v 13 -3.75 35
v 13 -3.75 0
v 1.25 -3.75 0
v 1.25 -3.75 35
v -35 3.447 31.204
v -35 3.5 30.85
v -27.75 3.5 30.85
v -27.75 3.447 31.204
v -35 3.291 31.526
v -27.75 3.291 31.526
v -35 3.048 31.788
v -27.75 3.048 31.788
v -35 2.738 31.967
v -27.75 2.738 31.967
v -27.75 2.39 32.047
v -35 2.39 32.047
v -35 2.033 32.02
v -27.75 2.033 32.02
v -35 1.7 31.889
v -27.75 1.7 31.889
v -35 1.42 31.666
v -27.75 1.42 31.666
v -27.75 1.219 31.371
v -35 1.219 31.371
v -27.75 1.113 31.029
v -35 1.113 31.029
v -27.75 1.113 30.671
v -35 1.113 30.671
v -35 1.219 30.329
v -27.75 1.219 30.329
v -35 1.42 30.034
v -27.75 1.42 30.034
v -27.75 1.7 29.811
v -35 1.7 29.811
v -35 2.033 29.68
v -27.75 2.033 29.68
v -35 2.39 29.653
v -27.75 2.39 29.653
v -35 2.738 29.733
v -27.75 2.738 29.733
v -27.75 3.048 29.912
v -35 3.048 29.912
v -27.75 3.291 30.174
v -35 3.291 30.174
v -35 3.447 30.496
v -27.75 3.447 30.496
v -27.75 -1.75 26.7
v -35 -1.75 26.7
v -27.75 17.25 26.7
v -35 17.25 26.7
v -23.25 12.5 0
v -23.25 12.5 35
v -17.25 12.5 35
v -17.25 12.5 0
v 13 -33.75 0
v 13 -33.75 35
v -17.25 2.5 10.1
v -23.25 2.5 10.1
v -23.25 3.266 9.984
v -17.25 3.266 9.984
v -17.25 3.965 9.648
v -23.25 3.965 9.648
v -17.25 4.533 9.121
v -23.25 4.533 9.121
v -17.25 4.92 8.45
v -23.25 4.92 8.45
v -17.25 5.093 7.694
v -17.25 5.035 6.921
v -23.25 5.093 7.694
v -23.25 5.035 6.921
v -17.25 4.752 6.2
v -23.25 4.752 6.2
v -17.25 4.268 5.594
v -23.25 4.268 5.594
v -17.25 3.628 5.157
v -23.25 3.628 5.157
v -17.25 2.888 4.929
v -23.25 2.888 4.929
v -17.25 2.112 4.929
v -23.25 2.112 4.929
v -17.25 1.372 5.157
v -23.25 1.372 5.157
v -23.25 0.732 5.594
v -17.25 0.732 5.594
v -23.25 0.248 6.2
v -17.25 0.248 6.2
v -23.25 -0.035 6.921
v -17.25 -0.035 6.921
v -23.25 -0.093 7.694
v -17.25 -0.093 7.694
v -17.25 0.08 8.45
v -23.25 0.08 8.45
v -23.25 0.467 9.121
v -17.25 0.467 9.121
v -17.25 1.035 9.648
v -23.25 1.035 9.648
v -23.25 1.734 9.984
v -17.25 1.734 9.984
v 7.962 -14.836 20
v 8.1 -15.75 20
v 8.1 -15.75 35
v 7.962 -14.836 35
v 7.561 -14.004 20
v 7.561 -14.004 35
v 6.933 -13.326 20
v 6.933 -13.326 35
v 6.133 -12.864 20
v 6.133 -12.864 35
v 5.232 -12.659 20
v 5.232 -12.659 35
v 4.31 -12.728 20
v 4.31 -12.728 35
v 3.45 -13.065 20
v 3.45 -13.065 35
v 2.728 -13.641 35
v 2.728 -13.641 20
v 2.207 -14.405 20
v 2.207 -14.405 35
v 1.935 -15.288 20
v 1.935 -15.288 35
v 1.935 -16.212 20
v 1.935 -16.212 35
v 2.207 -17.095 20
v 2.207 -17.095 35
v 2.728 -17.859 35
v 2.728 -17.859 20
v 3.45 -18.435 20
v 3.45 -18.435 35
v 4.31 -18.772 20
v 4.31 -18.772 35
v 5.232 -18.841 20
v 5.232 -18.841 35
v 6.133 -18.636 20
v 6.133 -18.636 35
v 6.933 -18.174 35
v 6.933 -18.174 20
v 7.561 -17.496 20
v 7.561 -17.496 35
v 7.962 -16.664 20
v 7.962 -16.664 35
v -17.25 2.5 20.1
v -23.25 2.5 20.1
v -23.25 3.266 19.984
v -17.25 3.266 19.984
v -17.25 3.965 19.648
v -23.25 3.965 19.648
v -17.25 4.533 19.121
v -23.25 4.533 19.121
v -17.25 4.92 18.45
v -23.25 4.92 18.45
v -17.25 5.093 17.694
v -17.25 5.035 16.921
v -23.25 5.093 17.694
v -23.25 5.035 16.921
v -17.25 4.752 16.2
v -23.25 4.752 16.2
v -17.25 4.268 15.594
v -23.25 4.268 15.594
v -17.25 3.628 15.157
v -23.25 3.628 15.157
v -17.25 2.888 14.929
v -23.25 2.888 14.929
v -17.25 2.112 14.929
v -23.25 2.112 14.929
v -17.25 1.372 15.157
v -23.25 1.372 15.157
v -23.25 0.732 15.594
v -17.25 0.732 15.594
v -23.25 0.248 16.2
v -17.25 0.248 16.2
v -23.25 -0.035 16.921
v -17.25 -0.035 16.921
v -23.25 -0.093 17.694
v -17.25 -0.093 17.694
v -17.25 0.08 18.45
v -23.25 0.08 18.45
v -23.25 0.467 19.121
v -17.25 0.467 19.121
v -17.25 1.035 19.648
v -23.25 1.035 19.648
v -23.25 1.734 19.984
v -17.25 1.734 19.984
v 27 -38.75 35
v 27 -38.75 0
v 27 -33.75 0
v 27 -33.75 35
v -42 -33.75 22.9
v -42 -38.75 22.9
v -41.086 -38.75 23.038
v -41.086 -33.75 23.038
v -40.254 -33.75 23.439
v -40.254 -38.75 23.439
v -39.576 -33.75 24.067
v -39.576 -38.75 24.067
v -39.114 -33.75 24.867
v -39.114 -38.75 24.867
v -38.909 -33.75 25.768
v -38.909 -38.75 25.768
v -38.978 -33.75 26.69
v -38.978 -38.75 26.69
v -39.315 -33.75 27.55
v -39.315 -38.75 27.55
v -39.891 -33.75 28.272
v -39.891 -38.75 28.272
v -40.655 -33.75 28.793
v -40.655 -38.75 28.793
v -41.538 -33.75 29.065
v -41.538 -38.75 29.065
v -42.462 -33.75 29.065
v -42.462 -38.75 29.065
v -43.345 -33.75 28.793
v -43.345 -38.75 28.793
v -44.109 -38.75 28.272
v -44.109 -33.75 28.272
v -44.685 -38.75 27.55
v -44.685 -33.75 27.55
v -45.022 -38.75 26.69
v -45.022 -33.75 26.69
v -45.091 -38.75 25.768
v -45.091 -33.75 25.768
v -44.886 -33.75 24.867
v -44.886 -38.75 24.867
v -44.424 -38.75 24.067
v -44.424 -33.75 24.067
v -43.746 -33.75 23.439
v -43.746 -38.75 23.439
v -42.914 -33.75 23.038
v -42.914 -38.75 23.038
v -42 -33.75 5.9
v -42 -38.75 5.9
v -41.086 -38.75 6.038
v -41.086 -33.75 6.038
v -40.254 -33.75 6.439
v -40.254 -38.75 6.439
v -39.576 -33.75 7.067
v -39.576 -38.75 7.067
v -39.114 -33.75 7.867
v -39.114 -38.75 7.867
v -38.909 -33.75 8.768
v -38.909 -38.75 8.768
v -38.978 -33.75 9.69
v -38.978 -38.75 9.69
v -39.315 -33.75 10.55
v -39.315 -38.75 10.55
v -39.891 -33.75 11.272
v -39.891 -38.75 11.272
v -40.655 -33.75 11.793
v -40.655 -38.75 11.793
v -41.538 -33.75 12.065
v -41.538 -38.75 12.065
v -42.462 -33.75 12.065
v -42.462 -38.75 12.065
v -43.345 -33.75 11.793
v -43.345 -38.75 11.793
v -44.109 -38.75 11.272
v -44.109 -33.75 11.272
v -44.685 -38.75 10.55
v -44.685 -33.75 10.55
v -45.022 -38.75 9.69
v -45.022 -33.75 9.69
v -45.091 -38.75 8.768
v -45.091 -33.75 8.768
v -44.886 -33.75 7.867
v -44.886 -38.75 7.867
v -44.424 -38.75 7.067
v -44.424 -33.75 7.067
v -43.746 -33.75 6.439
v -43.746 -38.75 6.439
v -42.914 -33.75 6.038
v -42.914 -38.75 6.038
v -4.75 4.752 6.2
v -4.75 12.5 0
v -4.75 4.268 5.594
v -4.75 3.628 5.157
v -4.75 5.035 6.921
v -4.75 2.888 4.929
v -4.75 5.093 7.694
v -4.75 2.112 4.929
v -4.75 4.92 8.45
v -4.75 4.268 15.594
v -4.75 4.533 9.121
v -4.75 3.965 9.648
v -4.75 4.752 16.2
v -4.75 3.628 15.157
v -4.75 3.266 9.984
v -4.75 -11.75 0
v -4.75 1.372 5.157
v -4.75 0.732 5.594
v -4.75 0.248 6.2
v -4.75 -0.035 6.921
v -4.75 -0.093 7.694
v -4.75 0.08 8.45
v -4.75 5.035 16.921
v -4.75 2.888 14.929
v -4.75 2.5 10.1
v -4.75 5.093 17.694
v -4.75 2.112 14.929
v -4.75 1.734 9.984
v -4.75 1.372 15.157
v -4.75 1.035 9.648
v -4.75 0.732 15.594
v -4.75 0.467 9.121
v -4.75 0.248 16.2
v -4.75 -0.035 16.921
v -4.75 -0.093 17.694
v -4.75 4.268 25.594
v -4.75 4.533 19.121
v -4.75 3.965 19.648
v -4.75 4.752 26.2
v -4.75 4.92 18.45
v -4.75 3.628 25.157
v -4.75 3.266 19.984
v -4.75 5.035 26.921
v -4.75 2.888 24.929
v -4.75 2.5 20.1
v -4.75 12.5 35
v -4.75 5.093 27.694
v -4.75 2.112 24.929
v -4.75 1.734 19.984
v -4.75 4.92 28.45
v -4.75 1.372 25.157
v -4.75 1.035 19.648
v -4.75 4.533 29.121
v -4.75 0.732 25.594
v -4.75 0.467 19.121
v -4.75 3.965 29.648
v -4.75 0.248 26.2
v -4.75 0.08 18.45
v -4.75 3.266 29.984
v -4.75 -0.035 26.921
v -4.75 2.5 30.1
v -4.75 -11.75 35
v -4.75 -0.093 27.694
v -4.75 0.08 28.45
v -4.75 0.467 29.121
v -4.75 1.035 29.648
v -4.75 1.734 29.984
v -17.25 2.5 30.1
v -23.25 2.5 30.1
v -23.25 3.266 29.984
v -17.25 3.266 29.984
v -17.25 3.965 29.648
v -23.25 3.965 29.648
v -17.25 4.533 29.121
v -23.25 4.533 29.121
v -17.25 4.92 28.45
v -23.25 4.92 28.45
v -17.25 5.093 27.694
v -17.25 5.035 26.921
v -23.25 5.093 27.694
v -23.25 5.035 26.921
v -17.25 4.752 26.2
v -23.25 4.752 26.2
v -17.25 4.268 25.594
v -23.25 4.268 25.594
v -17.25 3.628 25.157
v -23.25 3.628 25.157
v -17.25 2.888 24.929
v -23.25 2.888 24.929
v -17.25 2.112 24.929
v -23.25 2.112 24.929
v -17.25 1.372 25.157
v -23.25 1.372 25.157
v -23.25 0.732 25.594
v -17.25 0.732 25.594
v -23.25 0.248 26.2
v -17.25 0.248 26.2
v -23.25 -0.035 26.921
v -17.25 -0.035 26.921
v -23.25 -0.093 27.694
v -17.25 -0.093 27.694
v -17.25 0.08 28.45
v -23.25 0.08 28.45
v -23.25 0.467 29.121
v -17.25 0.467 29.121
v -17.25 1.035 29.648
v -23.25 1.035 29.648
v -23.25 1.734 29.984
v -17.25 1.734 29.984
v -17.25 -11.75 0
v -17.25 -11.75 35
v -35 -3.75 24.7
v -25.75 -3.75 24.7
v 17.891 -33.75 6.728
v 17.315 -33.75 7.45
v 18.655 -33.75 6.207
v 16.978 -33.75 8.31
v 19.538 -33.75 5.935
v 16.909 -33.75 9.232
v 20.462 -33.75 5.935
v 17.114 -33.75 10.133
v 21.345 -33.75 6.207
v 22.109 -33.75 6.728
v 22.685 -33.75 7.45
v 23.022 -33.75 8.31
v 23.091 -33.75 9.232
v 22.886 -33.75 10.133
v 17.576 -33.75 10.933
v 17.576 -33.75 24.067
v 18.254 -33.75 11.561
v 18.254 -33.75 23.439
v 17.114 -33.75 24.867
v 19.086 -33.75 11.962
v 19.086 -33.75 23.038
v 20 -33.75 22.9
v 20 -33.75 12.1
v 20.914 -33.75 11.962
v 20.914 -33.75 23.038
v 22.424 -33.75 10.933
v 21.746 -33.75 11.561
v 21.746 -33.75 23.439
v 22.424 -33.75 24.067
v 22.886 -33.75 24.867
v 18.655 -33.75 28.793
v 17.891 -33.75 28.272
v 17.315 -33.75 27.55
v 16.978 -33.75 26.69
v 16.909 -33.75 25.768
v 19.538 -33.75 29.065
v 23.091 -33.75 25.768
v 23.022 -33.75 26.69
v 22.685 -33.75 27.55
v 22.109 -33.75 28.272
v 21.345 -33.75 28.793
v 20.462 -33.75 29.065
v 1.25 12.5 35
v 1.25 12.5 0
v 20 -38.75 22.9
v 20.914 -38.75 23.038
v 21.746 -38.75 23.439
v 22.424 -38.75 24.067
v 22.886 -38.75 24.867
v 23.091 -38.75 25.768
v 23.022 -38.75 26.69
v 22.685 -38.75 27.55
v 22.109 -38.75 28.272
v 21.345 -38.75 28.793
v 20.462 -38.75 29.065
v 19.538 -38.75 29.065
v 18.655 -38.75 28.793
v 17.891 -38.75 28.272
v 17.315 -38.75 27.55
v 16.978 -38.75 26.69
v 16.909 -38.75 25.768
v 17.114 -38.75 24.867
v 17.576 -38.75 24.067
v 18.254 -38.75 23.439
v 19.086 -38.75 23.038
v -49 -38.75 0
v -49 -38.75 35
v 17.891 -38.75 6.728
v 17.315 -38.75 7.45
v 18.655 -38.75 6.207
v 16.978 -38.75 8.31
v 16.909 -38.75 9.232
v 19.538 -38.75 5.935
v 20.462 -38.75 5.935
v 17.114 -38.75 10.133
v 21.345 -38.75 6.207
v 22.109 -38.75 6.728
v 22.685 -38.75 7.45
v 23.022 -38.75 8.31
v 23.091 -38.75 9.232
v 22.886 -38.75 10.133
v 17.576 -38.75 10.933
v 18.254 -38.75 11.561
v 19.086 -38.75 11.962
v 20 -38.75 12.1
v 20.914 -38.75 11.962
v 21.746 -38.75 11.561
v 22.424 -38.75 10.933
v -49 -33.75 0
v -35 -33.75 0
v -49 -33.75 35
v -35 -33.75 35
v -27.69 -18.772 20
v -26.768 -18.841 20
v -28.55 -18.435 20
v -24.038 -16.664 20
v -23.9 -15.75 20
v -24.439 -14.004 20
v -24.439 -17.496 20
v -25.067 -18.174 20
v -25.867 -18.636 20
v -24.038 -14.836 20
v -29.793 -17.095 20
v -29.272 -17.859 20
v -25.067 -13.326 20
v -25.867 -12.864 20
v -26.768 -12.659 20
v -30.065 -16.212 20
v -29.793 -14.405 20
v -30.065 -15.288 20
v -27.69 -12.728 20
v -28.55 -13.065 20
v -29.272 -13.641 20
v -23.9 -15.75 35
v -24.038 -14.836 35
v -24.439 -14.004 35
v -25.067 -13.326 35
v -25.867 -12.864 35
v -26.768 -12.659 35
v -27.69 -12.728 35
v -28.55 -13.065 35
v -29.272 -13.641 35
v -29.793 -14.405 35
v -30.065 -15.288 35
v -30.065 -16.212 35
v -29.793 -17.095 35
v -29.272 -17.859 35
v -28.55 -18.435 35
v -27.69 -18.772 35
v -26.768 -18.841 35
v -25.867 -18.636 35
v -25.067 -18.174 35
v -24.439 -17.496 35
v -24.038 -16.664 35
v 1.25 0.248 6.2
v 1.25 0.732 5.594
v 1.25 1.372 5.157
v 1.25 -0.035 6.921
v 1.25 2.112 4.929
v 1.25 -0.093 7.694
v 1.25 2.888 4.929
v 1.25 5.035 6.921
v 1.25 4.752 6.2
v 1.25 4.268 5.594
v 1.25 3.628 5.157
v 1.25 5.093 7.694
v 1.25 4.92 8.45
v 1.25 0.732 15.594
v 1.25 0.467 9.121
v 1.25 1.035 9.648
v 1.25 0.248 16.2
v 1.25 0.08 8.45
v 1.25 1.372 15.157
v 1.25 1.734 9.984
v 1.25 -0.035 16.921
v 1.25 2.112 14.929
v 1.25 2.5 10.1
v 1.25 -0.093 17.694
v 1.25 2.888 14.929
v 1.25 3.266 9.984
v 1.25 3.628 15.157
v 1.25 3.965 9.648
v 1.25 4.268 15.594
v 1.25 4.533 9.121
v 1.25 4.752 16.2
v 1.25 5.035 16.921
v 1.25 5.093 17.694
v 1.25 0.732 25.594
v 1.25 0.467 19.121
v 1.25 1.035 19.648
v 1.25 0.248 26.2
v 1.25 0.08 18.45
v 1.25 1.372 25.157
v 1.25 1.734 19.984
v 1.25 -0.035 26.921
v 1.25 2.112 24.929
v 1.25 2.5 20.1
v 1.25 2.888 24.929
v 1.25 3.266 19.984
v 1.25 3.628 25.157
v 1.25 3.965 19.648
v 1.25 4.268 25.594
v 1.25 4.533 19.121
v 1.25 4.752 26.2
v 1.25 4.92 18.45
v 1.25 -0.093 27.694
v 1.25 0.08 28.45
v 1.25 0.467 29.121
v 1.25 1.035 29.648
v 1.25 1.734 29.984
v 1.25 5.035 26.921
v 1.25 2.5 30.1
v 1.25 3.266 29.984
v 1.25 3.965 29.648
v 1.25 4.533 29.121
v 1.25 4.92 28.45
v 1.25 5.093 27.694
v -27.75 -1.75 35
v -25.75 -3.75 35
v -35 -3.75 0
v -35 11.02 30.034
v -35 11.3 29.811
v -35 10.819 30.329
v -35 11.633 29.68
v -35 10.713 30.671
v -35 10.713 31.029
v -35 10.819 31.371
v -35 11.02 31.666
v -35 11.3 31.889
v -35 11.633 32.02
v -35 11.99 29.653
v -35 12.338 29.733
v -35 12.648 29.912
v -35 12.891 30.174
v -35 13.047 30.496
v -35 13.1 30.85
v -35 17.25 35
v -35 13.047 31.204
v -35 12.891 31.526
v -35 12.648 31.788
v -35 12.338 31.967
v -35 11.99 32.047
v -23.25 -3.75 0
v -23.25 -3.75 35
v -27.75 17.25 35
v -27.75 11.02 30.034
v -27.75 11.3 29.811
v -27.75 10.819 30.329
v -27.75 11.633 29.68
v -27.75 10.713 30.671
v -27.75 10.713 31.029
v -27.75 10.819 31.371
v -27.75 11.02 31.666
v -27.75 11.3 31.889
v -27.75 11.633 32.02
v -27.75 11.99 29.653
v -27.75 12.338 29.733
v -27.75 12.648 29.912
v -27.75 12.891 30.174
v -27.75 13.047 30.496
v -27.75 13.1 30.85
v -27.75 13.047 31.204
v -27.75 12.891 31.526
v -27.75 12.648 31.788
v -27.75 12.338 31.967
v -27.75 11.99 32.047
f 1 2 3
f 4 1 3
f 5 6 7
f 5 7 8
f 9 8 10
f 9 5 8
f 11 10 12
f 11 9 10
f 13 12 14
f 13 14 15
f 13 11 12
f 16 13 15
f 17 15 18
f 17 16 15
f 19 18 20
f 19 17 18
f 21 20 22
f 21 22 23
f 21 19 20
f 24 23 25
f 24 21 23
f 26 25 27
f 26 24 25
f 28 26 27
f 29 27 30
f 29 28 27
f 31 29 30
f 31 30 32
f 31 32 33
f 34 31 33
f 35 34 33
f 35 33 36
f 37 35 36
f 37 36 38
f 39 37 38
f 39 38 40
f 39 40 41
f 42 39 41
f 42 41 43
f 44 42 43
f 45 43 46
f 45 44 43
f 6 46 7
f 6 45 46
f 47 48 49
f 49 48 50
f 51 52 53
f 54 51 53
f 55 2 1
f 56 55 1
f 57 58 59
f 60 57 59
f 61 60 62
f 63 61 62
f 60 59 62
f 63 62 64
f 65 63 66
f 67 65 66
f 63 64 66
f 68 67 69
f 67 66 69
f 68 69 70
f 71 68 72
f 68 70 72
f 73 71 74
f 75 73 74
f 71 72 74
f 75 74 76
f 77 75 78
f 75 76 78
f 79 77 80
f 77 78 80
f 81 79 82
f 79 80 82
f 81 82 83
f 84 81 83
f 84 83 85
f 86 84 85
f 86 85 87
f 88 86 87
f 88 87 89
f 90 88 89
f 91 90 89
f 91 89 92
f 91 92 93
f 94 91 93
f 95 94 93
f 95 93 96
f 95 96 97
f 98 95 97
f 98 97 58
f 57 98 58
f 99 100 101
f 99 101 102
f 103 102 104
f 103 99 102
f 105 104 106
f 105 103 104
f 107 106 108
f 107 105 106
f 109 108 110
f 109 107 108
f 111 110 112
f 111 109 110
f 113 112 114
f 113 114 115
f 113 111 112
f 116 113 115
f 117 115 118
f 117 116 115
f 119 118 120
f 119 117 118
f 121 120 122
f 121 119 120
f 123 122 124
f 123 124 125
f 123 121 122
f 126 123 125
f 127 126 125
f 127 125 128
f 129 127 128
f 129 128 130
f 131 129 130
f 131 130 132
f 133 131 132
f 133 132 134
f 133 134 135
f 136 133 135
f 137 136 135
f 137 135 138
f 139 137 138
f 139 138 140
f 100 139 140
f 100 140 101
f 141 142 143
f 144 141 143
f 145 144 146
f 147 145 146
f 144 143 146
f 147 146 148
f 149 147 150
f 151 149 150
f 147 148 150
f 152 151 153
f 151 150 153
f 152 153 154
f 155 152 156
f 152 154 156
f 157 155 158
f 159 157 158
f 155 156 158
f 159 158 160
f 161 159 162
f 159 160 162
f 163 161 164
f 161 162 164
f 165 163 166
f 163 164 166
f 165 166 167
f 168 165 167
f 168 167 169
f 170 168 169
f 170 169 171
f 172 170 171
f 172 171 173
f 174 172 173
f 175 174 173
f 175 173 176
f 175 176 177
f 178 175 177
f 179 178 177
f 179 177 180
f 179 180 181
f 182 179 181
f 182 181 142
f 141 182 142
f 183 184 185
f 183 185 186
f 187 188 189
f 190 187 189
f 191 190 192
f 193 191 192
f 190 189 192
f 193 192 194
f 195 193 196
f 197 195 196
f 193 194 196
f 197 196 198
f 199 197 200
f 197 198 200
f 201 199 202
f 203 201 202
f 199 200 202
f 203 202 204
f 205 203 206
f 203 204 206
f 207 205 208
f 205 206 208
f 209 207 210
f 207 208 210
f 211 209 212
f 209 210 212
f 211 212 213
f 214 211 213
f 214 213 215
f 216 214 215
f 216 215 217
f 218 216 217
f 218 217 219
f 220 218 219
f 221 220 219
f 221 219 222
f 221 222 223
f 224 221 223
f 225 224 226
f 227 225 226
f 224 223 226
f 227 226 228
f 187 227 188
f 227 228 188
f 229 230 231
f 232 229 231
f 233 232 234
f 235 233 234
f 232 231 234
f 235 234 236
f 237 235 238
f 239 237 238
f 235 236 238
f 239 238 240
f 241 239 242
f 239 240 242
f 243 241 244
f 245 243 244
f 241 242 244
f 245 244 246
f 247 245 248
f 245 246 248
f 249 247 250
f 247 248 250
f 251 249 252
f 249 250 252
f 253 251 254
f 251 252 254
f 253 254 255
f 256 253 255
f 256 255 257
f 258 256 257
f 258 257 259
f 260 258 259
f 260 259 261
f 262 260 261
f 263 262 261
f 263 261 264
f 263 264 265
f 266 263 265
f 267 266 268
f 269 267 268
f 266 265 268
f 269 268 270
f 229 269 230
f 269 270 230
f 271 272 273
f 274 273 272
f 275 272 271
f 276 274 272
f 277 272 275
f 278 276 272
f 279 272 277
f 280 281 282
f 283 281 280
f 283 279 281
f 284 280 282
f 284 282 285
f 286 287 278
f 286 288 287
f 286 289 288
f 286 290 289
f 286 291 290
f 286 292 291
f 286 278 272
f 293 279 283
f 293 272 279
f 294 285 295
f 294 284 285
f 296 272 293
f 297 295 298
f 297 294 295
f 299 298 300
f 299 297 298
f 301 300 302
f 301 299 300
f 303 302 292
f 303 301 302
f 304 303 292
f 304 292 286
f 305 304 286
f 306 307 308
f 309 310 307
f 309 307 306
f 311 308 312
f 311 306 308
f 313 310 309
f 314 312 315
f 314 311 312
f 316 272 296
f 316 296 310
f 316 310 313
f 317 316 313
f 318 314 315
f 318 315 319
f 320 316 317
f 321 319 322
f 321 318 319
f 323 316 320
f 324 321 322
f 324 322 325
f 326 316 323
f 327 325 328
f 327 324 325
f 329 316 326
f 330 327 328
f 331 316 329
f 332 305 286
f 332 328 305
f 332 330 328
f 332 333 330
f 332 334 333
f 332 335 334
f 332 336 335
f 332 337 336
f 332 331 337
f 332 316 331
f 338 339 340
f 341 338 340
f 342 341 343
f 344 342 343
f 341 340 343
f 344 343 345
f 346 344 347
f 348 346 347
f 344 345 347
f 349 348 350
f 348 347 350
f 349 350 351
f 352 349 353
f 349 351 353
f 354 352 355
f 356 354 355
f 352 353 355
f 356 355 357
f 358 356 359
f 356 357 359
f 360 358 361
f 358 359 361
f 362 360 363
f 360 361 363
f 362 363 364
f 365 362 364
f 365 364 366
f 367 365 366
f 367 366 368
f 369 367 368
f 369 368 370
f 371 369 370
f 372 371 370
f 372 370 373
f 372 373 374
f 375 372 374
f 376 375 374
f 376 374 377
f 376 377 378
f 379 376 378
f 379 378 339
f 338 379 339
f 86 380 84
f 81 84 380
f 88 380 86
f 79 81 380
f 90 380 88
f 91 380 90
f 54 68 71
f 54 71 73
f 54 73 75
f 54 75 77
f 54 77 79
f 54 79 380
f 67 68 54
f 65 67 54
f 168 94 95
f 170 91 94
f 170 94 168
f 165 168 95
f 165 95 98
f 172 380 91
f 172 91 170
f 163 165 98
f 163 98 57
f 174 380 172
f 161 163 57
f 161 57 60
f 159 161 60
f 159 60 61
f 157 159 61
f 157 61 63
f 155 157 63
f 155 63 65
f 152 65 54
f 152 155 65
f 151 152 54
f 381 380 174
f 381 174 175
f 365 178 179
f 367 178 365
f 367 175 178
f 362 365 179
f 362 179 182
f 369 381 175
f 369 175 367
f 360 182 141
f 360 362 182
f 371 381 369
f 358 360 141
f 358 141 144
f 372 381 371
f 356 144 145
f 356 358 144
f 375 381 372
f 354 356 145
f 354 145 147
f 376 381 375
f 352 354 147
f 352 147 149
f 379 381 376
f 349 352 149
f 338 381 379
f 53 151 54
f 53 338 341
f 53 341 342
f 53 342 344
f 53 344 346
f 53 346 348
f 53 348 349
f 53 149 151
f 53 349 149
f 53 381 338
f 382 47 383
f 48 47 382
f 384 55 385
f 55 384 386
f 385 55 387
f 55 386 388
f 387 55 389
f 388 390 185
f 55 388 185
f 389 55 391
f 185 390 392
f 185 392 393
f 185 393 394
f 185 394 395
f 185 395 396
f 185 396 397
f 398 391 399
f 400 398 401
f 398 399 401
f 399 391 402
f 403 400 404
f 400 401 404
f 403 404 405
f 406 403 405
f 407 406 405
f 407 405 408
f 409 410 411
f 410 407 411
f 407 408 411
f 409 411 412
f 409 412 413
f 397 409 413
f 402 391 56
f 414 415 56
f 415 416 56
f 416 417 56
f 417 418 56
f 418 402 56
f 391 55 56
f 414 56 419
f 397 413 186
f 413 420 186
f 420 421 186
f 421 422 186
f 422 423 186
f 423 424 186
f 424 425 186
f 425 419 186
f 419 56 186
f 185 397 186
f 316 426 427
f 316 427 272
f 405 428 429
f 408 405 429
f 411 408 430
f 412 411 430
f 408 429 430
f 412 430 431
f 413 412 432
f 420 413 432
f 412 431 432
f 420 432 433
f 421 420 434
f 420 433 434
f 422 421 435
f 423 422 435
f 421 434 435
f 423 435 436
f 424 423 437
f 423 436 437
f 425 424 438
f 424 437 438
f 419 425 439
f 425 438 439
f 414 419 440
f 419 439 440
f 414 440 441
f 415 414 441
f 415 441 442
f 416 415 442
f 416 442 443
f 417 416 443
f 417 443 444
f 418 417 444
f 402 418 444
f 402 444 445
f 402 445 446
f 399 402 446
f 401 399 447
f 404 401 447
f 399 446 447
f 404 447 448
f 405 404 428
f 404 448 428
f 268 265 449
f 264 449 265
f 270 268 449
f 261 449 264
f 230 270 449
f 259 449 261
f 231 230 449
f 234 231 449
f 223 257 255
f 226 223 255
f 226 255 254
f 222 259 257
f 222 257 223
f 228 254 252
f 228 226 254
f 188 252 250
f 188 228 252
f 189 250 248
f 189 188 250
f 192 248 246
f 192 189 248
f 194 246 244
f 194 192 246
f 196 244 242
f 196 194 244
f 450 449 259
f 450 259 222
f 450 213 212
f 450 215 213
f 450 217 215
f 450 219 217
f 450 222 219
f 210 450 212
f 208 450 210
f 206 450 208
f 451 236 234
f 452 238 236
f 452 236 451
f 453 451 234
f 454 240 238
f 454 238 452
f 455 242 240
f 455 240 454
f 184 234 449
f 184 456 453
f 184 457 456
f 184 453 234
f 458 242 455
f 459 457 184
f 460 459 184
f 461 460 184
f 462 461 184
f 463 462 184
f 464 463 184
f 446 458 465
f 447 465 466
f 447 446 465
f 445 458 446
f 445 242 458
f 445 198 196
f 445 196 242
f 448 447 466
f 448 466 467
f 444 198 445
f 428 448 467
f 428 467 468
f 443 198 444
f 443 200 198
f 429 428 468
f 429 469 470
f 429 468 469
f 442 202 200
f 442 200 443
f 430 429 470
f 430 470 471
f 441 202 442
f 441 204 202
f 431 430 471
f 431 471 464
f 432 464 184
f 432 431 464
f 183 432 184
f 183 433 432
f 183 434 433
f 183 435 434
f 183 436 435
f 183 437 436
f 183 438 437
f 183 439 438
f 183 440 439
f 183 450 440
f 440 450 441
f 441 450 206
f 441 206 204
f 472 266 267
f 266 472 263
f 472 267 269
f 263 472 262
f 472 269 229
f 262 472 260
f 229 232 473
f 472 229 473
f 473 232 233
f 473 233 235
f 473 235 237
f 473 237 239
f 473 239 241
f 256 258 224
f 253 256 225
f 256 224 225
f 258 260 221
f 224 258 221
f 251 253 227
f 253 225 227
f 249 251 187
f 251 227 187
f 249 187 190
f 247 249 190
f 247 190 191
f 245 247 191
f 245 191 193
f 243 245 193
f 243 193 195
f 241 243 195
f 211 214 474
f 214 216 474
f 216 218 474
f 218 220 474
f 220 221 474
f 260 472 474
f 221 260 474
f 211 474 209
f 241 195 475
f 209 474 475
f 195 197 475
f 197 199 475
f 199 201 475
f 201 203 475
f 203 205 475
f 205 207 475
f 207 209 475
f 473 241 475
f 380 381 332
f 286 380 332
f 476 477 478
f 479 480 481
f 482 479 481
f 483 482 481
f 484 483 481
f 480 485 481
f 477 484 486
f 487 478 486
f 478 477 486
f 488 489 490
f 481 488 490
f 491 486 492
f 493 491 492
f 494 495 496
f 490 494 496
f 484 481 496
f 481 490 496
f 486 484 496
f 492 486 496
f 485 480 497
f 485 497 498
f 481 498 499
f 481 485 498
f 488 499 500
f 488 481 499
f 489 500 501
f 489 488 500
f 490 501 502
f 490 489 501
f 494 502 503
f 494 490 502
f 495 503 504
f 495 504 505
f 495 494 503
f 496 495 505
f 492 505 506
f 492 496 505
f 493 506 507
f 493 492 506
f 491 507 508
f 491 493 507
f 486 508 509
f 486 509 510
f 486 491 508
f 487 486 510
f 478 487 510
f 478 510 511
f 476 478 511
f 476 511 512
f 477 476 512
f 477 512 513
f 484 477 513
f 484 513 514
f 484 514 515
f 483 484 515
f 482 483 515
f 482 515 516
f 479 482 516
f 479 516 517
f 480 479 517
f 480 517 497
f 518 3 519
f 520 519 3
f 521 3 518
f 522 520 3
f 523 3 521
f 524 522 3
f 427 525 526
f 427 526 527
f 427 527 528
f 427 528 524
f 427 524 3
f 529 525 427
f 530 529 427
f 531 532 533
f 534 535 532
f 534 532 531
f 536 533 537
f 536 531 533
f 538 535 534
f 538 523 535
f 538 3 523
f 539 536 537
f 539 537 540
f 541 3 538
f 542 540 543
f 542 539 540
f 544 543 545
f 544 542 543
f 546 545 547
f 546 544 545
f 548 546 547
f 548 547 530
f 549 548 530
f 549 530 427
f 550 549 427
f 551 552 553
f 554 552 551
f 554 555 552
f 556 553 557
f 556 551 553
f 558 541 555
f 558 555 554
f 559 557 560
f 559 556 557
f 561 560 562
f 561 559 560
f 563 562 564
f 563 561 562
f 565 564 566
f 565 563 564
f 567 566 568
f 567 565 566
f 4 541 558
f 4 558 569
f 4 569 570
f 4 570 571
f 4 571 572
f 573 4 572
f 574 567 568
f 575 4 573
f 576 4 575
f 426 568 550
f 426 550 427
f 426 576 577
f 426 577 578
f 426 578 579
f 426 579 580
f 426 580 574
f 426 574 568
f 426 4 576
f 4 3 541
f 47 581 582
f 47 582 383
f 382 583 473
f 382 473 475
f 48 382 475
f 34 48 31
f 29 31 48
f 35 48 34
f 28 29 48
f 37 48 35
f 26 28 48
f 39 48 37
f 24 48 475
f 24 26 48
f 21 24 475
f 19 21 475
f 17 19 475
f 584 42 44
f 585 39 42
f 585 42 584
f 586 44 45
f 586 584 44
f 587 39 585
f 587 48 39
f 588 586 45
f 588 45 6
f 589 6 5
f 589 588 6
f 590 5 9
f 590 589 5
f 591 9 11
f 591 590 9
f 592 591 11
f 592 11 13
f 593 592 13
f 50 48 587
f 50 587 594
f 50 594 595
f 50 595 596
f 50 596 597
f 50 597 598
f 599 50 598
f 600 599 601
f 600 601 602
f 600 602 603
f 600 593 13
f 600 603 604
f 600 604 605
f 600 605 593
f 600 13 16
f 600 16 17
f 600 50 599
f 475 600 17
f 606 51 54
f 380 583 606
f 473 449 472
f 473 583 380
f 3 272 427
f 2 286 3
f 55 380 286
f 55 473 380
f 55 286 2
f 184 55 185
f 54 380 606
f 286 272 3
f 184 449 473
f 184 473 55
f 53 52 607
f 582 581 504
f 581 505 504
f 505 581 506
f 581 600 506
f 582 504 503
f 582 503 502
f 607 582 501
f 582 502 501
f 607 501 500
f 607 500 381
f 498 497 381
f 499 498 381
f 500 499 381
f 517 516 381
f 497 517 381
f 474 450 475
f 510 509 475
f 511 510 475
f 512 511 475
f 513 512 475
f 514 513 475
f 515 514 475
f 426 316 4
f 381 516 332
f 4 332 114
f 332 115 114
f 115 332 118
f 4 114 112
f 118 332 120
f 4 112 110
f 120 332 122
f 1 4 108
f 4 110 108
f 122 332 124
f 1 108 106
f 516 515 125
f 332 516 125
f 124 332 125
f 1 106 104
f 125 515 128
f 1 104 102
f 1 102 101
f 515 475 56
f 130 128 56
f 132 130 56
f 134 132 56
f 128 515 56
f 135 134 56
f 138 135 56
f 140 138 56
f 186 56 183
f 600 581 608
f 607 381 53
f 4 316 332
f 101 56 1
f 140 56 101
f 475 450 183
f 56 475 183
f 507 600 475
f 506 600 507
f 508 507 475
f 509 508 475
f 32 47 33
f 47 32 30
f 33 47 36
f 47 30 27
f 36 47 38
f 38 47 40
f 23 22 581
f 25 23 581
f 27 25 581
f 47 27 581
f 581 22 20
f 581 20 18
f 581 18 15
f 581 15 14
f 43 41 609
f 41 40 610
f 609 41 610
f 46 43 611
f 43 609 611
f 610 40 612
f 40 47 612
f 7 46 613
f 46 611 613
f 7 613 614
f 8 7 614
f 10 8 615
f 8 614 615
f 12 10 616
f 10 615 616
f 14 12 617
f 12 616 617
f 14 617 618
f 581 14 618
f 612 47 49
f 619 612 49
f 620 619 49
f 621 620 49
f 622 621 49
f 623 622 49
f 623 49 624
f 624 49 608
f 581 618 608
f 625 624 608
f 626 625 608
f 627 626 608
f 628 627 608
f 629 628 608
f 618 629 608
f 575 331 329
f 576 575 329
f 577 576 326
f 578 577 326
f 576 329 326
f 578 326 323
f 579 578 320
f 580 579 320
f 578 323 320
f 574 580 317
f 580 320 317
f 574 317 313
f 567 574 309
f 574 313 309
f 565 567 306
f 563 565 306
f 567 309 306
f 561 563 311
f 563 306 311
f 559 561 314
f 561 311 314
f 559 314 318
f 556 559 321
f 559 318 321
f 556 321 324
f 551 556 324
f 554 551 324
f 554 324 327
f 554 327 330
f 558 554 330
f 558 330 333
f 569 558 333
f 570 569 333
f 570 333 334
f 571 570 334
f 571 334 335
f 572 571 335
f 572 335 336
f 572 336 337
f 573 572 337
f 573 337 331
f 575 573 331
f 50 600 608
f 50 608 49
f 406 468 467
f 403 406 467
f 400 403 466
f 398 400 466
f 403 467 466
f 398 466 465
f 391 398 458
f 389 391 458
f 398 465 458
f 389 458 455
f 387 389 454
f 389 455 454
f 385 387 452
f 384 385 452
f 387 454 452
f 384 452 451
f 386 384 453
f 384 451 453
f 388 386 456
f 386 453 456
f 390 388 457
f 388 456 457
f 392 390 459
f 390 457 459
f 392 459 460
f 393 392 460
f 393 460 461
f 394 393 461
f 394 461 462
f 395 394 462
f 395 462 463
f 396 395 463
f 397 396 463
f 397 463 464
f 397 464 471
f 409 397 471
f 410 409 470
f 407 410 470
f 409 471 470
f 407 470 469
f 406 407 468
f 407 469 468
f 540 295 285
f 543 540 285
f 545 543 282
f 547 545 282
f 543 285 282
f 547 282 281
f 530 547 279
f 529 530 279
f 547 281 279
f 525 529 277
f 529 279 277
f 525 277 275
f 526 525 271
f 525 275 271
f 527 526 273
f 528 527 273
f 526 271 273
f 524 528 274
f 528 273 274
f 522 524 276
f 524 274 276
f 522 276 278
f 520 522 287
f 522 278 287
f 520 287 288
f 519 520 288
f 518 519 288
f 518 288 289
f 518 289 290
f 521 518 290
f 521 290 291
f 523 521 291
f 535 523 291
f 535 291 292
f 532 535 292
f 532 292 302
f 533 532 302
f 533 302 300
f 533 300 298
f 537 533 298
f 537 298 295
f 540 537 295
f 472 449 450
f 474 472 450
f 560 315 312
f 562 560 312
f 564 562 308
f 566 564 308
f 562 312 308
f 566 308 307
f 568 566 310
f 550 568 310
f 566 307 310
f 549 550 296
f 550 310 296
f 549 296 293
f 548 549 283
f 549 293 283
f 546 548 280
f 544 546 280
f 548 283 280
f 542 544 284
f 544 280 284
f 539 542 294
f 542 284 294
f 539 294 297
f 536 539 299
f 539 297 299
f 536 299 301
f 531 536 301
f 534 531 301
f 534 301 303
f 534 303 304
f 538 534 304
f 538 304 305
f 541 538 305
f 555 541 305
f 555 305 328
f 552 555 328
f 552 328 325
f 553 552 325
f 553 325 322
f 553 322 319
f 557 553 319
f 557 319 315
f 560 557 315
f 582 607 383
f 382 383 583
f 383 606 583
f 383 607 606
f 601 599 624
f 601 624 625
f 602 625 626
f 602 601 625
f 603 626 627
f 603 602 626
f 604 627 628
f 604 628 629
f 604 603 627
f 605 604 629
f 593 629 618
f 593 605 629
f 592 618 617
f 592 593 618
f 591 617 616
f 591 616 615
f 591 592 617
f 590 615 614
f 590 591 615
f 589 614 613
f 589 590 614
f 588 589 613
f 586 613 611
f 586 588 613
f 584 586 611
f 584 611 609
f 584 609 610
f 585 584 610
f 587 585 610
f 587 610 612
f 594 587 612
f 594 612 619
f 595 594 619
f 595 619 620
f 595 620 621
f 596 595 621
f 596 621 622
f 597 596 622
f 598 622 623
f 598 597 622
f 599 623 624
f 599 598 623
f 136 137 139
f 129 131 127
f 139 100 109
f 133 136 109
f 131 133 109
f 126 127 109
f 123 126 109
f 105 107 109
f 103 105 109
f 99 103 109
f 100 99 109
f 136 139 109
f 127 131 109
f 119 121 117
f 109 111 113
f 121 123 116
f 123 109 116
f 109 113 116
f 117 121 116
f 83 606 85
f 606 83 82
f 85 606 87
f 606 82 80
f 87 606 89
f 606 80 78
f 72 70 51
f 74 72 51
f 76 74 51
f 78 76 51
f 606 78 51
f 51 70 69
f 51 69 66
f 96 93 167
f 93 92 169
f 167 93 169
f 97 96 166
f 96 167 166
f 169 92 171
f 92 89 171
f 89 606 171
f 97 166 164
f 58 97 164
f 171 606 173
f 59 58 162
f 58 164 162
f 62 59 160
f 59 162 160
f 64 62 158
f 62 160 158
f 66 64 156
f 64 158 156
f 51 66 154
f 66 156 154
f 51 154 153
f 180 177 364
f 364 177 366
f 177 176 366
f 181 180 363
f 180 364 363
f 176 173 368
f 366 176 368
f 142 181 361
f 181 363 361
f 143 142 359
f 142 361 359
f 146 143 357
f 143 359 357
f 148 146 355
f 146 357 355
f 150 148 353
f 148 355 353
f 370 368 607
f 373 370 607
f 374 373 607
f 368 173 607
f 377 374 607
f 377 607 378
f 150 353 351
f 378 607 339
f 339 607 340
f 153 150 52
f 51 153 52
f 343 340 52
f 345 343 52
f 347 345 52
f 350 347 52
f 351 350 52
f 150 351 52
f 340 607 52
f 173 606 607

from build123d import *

# Parameters (mm, degrees)
SKETCH1_R                = 3.1
BOSS_EXTRUDE1_DEPTH      = 35
SKETCH2_R                = 3.1
BOSS_EXTRUDE2_DEPTH      = 20
BOSS_EXTRUDE3_DEPTH      = 35
SKETCH4_R                = 2.6
CUT_EXTRUDE1_DEPTH       = 59.014006929
SKETCH6_W                = 12.5
SKETCH6_H                = 8
CUT_EXTRUDE2_DEPTH       = 58.241265709
SKETCH7_W                = 48
SKETCH7_H                = 35
BOSS_EXTRUDE4_DEPTH      = 10
SKETCH8_W                = 14
SKETCH8_H                = 35
SKETCH8_R                = 3.1
BOSS_EXTRUDE5_DEPTH      = 5
BOSS_EXTRUDE6_DEPTH      = 2.4
BOSS_EXTRUDE6_DEPTH_BACK = 4.85
SKETCH9_R                = 1.2
CHAMFER1_SIZE            = 2


with BuildPart() as part:
    # Sketch1 → Boss-Extrude1 (new body)
    with BuildSketch(Plane.XY):
        Polygon((-5, -3.75), (-35, -3.75), (-35, -28.75), (13, -28.75), (13, -3.75), align=None)
        with Locations((5, -15.75)):
            Circle(SKETCH1_R, mode=Mode.SUBTRACT)
        with Locations((-27, -15.75)):
            Circle(SKETCH1_R, mode=Mode.SUBTRACT)
    extrude(amount=BOSS_EXTRUDE1_DEPTH)

    # Sketch2 → Boss-Extrude2 (add)
    with BuildSketch(Plane(origin=(0, 0, 0), x_dir=(-1, 0, 0), z_dir=(0, 0, -1))):
        with Locations((27, -15.75)):
            Circle(SKETCH2_R)
        with Locations((-5, -15.75)):
            Circle(SKETCH2_R)
    extrude(amount=-BOSS_EXTRUDE2_DEPTH)

    # Sketch3 → Boss-Extrude3 (add)
    with BuildSketch(Plane.XY.offset(35)):
        Polygon((-17.25, 2.5), (-17.25, -7.5), (-23.25, -7.5), (-23.25, 12.5), (-17.25, 12.5), align=None)
        Polygon((-4.75, 2.5), (-4.75, -7.5), (1.25, -7.5), (1.25, 12.5), (-4.75, 12.5), align=None)
    extrude(amount=-BOSS_EXTRUDE3_DEPTH)

    # Sketch4 → Cut-Extrude1 (cut, through all)
    with BuildSketch(Plane.ZY.offset(23.25)):
        with Locations((17.5, 2.5)):
            Circle(SKETCH4_R)
        with Locations((27.5, 2.5)):
            Circle(SKETCH4_R)
        with Locations((7.5, 2.5)):
            Circle(SKETCH4_R)
    extrude(amount=-CUT_EXTRUDE1_DEPTH, mode=Mode.SUBTRACT)

    # Sketch6 → Cut-Extrude2 (cut, through all)
    with BuildSketch(Plane.XY.offset(35)):
        with Locations((-11, -7.75)):
            Rectangle(SKETCH6_W, SKETCH6_H)
    extrude(amount=-CUT_EXTRUDE2_DEPTH, mode=Mode.SUBTRACT)

    # Sketch7 → Boss-Extrude4 (add)
    with BuildSketch(Plane.XZ.offset(28.75)):
        with Locations((-11, 17.5)):
            Rectangle(SKETCH7_W, SKETCH7_H)
    extrude(amount=BOSS_EXTRUDE4_DEPTH)

    # Sketch8 → Boss-Extrude5 (add)
    # profile 1 of 2: a face of its own
    with BuildSketch(Plane.XZ.offset(38.75)):
        with Locations((-42, 17.5)):
            Rectangle(SKETCH8_W, SKETCH8_H)
        with Locations(Location((-42, 9, 0), (0, 0, 270))):
            Circle(SKETCH8_R, mode=Mode.SUBTRACT)
        with Locations(Location((-42, 26, 0), (0, 0, 270))):
            Circle(SKETCH8_R, mode=Mode.SUBTRACT)
    # profile 2 of 2: a face of its own
    with BuildSketch(Plane.XZ.offset(38.75)):
        with Locations((20, 17.5)):
            Rectangle(SKETCH8_W, SKETCH8_H)
        with Locations(Location((20, 9, 0), (0, 0, 90))):
            Circle(SKETCH8_R, mode=Mode.SUBTRACT)
        with Locations(Location((20, 26, 0), (0, 0, 270))):
            Circle(SKETCH8_R, mode=Mode.SUBTRACT)
    extrude(amount=-BOSS_EXTRUDE5_DEPTH)

    # Sketch9 → Boss-Extrude6 (add, two sides: drawn at the far end of the back side and taken through both)
    with BuildSketch(Plane(origin=(-30.15, 41.369079409, 256.718616892), x_dir=(0, 0, -1), z_dir=(1, 0, 0)).offset(-BOSS_EXTRUDE6_DEPTH_BACK)):
        Polygon((230.018616892, -24.119079409), (230.018616892, -45.119079409), (230.018616892, -49.119079409), (221.718616892, -49.119079409), (221.718616892, -24.119079409), align=None)
        with Locations(Location((225.868616892, -29.469079409, 0), (0, 0, 90))):
            Circle(SKETCH9_R, mode=Mode.SUBTRACT)
        with Locations(Location((225.868616892, -39.069079409, 0), (0, 0, 90))):
            Circle(SKETCH9_R, mode=Mode.SUBTRACT)
    extrude(amount=BOSS_EXTRUDE6_DEPTH + BOSS_EXTRUDE6_DEPTH_BACK)

    # Chamfer1
    chamfer1_edges = [part.edges().sort_by_distance(p)[0] for p in [
        (-27.75, -3.75, 30.85),
        (-31.375, -3.75, 26.7),
    ]]
    chamfer(chamfer1_edges, length=CHAMFER1_SIZE)


solid = part.part
